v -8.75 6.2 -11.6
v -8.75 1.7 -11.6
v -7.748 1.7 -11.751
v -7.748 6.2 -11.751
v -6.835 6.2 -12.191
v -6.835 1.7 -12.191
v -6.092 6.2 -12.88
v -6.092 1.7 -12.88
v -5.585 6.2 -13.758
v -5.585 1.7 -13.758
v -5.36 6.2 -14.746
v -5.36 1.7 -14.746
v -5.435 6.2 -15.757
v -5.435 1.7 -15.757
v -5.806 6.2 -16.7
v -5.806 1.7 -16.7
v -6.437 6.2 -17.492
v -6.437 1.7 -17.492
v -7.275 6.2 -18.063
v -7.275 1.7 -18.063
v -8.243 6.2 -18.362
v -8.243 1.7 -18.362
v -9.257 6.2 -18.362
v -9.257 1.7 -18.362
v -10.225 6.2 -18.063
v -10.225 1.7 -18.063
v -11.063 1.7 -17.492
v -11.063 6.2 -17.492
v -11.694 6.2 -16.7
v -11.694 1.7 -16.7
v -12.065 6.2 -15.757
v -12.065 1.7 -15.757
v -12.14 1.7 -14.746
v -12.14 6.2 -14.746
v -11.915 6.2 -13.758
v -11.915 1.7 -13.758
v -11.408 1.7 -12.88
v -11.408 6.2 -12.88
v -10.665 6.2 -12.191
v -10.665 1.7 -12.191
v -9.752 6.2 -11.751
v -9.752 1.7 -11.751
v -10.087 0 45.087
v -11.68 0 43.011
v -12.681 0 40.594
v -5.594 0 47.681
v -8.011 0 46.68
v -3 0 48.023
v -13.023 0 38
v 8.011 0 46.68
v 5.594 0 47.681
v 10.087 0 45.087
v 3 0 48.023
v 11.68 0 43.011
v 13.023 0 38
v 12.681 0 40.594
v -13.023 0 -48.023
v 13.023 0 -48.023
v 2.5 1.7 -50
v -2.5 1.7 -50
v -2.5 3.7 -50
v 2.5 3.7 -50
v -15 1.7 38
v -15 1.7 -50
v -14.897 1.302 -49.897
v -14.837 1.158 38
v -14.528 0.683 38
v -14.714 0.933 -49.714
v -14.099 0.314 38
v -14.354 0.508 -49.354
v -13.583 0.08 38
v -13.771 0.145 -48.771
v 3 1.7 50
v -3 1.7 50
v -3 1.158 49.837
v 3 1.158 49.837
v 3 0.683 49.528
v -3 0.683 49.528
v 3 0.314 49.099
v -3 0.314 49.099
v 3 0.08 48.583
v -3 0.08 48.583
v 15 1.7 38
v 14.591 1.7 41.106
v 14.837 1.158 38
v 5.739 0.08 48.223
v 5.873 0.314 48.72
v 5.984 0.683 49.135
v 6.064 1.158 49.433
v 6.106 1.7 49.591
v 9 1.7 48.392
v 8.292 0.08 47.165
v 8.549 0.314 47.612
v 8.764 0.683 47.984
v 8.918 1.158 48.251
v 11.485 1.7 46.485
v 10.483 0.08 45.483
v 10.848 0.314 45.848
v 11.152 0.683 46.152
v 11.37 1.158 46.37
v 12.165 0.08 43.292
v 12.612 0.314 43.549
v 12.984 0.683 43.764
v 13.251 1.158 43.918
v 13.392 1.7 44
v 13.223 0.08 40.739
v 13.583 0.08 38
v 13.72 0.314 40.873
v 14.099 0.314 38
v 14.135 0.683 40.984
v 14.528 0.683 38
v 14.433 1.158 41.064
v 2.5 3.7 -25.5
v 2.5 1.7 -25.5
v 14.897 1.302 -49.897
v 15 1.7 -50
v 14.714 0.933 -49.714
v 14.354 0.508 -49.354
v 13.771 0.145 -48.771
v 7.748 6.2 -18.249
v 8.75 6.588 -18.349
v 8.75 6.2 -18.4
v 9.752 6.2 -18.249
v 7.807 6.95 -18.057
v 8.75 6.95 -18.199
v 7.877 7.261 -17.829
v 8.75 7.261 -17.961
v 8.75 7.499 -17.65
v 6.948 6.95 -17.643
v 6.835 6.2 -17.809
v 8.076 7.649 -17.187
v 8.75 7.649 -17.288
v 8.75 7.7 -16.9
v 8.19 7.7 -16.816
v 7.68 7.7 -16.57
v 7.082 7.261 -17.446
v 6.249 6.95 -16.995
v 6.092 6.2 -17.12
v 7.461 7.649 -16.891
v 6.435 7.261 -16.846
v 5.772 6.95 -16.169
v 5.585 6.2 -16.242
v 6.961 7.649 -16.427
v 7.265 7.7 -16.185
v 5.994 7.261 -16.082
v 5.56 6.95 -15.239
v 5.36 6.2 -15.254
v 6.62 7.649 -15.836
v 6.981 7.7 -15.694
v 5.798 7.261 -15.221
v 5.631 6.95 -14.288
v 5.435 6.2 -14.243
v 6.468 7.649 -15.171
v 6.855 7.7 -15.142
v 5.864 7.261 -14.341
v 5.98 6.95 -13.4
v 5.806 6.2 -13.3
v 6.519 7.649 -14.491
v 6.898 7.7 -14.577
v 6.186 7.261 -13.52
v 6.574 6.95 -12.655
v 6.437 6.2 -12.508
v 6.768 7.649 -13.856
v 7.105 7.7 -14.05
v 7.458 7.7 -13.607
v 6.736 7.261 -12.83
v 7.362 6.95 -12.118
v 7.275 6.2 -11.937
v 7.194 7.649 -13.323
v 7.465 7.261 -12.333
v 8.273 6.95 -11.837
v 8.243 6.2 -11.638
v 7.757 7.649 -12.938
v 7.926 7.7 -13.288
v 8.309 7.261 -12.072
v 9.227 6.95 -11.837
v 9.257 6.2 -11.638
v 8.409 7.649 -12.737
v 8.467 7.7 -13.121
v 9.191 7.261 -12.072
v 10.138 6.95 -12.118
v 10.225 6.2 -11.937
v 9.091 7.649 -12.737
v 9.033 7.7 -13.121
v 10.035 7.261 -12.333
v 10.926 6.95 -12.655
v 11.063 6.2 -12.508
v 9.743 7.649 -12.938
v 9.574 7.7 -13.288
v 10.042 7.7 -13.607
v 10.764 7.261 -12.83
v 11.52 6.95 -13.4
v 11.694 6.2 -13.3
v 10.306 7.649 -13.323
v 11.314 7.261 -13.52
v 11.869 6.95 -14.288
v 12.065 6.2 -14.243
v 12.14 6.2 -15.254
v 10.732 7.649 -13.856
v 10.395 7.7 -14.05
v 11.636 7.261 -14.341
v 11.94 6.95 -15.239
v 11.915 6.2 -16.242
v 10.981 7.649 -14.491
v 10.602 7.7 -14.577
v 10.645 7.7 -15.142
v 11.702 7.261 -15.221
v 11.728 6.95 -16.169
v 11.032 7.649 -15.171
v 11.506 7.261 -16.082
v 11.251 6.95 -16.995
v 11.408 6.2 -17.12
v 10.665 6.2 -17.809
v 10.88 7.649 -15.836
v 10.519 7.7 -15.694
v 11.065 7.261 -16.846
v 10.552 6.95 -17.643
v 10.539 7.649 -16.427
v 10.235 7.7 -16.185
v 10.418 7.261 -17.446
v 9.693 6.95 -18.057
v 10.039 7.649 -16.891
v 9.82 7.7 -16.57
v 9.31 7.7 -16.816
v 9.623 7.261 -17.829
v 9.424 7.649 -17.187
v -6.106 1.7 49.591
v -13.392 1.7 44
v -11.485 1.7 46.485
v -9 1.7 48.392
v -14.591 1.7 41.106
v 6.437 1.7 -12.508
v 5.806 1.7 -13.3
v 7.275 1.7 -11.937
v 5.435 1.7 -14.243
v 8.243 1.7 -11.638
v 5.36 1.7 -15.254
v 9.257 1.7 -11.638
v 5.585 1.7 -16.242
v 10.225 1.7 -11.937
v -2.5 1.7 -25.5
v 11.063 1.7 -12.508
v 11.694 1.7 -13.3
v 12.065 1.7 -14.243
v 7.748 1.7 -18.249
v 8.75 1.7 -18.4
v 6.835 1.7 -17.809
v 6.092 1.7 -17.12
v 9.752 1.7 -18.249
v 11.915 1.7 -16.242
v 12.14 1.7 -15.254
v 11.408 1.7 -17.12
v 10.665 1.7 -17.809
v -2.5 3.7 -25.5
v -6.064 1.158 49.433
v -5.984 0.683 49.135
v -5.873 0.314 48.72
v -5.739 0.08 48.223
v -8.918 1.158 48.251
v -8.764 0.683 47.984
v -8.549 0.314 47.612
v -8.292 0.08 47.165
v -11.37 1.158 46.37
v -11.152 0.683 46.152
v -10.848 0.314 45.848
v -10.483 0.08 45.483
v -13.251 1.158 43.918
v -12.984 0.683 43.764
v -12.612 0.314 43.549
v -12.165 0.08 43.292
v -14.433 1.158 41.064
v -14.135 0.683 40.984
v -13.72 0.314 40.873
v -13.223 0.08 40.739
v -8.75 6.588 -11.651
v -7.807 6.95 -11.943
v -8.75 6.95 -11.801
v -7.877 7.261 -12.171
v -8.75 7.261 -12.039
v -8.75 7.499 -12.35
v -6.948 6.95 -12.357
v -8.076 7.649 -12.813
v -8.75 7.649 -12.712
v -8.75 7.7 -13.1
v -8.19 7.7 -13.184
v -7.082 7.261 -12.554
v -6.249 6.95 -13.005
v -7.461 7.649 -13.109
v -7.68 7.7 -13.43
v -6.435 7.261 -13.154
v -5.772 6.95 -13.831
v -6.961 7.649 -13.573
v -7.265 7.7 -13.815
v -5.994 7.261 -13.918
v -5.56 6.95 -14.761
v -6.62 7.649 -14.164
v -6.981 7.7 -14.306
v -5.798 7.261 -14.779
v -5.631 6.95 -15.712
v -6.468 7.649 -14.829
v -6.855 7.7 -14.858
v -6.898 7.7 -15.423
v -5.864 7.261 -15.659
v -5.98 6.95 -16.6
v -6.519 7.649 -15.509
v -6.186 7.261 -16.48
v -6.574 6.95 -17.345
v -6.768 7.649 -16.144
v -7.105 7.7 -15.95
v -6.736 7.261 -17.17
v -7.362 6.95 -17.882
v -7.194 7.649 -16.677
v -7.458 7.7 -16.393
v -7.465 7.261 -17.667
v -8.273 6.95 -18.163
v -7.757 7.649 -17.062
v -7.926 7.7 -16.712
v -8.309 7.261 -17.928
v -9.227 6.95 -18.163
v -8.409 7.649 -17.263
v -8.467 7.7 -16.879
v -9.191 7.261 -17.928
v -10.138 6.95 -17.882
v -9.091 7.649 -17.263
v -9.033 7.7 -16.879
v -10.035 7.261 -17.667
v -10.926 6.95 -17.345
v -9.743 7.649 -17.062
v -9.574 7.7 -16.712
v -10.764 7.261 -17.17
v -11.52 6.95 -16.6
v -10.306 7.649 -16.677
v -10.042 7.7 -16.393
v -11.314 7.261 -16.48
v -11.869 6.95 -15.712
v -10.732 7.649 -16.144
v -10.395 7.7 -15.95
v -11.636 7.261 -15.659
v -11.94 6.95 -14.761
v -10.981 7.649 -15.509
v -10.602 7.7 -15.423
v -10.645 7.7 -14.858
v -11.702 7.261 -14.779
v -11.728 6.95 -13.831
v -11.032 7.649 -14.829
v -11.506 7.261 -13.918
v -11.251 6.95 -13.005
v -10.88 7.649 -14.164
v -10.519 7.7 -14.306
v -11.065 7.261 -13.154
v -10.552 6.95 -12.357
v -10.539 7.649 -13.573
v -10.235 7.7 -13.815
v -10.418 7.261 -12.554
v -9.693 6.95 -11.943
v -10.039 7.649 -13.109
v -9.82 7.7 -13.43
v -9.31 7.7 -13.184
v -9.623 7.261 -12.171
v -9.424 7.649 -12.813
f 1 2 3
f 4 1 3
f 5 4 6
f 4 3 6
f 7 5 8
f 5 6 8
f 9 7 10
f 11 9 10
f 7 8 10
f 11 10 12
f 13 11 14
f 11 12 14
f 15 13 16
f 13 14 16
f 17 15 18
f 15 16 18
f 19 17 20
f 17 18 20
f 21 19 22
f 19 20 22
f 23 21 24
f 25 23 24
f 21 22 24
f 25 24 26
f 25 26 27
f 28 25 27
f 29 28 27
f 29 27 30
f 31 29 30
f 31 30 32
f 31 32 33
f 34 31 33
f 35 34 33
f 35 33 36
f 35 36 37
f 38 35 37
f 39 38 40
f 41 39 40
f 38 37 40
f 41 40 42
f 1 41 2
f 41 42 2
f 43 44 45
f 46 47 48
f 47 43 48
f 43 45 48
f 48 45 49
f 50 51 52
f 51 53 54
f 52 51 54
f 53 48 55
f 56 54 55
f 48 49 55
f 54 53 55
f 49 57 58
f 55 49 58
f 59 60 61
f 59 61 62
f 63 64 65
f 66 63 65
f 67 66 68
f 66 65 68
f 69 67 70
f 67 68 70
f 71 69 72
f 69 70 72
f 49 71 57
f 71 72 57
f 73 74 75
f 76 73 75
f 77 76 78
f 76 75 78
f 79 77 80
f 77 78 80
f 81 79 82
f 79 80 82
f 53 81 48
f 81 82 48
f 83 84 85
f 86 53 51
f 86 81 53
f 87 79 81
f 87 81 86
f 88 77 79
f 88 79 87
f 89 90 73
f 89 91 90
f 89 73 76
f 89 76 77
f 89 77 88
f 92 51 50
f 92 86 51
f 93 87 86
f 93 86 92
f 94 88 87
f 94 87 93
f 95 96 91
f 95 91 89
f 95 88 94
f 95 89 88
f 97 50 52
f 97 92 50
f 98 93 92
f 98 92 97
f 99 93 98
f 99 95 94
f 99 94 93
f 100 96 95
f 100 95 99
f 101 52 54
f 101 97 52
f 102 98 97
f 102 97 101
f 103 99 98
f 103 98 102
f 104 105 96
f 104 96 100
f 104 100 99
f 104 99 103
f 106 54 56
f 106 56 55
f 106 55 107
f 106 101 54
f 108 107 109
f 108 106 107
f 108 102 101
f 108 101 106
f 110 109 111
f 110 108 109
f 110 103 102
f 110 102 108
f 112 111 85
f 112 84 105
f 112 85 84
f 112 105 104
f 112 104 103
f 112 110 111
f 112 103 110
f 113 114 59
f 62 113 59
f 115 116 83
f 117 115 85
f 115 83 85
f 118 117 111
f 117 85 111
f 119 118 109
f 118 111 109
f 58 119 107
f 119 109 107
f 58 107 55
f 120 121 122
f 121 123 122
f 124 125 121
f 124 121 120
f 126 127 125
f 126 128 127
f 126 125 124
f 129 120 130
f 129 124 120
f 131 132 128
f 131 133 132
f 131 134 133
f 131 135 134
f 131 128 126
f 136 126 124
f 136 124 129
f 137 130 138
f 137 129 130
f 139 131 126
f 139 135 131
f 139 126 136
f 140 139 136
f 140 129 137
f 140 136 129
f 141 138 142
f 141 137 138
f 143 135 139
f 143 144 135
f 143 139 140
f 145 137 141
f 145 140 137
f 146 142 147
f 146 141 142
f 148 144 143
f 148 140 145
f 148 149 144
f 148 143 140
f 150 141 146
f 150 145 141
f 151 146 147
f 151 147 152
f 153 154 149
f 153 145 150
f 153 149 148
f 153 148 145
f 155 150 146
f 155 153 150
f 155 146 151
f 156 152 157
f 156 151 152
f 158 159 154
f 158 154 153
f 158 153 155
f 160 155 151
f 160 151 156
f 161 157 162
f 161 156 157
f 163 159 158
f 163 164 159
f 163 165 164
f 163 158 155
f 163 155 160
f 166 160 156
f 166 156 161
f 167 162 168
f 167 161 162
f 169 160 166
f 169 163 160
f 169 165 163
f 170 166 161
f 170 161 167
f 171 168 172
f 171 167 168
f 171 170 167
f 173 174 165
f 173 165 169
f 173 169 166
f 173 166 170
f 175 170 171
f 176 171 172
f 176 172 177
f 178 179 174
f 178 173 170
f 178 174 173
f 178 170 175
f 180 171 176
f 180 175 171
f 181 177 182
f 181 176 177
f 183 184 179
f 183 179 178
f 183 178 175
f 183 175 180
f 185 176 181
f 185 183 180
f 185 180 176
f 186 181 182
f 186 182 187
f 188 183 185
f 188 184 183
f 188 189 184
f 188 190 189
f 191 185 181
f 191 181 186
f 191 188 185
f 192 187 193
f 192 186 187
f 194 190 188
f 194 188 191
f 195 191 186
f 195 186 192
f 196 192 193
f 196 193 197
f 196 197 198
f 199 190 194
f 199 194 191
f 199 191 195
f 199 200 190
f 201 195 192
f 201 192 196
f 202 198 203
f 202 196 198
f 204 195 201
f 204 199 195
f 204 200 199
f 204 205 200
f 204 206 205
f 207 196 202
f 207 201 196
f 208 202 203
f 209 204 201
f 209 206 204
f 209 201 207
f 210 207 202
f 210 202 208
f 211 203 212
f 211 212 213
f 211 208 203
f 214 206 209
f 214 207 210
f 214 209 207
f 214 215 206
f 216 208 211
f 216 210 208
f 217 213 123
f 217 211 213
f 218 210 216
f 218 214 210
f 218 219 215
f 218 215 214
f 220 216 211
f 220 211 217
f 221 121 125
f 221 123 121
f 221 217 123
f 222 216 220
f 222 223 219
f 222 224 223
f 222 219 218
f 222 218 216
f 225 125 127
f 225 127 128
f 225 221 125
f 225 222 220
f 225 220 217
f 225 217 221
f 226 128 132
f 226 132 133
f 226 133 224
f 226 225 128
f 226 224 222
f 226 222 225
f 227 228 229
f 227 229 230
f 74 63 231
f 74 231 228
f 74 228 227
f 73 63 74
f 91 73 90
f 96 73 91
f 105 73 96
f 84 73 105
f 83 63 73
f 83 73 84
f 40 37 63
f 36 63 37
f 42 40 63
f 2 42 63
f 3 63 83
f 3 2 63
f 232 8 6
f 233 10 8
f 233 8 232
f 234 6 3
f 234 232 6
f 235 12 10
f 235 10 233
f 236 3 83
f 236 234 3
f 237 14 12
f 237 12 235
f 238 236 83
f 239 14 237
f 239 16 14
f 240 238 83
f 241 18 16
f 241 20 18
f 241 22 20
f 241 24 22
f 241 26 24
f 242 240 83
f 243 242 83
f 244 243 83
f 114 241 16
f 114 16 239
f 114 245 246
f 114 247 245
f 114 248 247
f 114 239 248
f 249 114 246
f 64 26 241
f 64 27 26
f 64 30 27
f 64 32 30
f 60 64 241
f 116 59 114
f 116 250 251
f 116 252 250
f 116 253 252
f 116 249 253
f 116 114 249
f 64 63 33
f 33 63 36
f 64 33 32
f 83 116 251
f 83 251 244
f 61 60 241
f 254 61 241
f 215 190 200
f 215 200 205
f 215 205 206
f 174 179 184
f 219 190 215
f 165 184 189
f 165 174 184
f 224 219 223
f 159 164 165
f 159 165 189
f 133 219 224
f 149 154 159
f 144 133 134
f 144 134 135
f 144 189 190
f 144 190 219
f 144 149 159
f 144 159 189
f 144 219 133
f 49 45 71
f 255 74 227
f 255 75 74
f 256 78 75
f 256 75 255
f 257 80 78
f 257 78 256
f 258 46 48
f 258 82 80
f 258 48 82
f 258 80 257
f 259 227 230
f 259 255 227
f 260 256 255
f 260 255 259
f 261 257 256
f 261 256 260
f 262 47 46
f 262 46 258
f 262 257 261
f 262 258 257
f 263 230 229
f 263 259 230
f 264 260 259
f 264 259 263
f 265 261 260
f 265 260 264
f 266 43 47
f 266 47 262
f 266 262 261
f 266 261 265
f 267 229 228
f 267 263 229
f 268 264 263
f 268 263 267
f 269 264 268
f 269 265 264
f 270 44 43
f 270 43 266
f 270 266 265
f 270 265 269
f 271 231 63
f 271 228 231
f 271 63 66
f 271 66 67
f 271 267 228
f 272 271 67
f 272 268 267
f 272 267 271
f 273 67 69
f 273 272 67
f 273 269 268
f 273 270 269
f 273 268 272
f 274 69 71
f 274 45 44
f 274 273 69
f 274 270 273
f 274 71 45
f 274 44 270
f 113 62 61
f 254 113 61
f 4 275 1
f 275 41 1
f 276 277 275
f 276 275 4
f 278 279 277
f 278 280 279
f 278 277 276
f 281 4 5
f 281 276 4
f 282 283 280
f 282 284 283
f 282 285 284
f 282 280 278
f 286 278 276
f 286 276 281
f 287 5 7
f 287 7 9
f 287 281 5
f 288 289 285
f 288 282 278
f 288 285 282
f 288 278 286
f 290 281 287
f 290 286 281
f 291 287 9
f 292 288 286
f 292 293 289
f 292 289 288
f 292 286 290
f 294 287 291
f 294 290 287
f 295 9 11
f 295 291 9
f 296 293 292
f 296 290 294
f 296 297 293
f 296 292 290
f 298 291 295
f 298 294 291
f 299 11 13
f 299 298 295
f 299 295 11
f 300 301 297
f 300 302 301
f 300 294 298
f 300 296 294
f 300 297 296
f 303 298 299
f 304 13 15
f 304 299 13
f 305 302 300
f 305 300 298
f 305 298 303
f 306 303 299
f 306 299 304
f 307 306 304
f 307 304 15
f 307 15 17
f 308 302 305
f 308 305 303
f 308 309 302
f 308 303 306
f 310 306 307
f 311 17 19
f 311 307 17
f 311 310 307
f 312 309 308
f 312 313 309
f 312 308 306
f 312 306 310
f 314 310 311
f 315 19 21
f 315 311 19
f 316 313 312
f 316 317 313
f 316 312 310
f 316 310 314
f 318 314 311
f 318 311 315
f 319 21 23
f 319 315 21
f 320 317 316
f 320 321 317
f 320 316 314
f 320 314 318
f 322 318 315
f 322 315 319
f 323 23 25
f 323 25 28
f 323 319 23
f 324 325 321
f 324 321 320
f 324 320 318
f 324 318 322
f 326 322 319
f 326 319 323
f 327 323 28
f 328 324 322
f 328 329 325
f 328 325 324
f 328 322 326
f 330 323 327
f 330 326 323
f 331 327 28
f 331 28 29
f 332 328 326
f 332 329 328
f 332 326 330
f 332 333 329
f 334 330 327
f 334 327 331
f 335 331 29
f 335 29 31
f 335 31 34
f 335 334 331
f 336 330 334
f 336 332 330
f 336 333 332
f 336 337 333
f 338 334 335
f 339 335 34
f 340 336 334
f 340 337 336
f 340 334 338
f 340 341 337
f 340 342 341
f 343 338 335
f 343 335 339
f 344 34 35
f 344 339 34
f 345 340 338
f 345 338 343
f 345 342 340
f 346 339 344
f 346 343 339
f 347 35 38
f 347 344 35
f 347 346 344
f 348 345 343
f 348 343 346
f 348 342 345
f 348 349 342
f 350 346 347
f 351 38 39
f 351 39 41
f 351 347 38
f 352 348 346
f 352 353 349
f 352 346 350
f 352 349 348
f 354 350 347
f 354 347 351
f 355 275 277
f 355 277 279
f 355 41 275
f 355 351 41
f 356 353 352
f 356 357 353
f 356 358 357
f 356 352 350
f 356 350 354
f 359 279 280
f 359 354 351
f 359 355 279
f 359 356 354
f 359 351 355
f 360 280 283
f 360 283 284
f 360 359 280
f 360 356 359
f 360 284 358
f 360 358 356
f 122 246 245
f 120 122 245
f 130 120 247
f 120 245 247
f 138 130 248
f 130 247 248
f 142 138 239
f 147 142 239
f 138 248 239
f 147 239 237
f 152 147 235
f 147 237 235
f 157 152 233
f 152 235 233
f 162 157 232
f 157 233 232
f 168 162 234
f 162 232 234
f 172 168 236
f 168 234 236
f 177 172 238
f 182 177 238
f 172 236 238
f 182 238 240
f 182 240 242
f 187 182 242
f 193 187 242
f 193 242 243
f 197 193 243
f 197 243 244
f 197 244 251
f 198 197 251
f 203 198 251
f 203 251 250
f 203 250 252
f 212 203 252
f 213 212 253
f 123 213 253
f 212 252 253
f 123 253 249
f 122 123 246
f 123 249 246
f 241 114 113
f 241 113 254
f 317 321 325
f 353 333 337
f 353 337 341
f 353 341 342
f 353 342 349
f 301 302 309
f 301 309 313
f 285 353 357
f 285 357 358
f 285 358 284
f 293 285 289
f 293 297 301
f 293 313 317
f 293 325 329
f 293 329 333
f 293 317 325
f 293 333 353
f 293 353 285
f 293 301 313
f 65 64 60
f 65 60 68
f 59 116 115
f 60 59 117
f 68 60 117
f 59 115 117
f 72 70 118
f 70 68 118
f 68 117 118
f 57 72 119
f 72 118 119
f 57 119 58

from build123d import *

# Parameters (mm, degrees)
SKETCH1_W           = 30
SKETCH1_H           = 100
BOSS_EXTRUDE1_DEPTH = 1.7
FILLET2_R           = 12
FILLET3_R           = 2
BOSS_EXTRUDE2_DEPTH = 2
SKETCH4_R           = 3.4
BOSS_EXTRUDE3_DEPTH = 6
FILLET4_R           = 1.5


with BuildPart() as part:
    # Sketch1 → Boss-Extrude1 (new body)
    with BuildSketch(Plane(origin=(0, 0, 0), x_dir=(1, 0, 0), z_dir=(0, 1, 0))):
        Rectangle(SKETCH1_W, SKETCH1_H)
    extrude(amount=BOSS_EXTRUDE1_DEPTH)

    # Fillet2
    fillet2_edges = [part.edges().sort_by_distance(p)[0] for p in [
        (-15, 0.85, 50),
        (15, 0.85, 50),
    ]]
    fillet(fillet2_edges, radius=FILLET2_R)

    # Fillet3
    # the kernel refuses this fillet: 2 mm, written as the material it takes off along each edge
    with BuildSketch(Plane(origin=(19.943429983, 0, -50), x_dir=(0, 0, 1), z_dir=(-1, 0, 0))) as fillet3_piece_1:
        with BuildLine():
            CenterArc((1.977371993, 2), FILLET3_R, 188.626926559, 81.373073441)
            Line((0, 1.7), (-0.03954744, 1.694))
            ThreePointArc((-0.03954744, 1.694), (-0.04, 0.85), (-0.04, 0))
            Line((-0.04, 0), (0, -0.04))
            Line((0, -0.04), (1.977371993, -0.04))
            Line((1.977371993, -0.04), (1.977371993, 0))
        make_face()
    extrude(amount=39.886859967, mode=Mode.SUBTRACT)
    with BuildSketch(Plane(origin=(-15, 0, -54.943429983), x_dir=(1, 0, 0), z_dir=(0, 0, 1)), Plane(origin=(15, 0, 38), x_dir=(-1, 0, 0), z_dir=(0, 0, -1))) as fillet3_piece_2:
        with BuildLine():
            CenterArc((1.977371993, 2), FILLET3_R, 188.626926559, 81.373073441)
            Line((0, 1.7), (-0.03954744, 1.694))
            ThreePointArc((-0.03954744, 1.694), (-0.04, 0.85), (-0.04, 0))
            Line((-0.04, 0), (0, -0.04))
            Line((0, -0.04), (1.977371993, -0.04))
            Line((1.977371993, -0.04), (1.977371993, 0))
        make_face()
    extrude(amount=92.943429983, mode=Mode.SUBTRACT)
    with BuildSketch(Plane(origin=(-3, 0, 38), x_dir=(0, 0, 1), z_dir=(1, 0, 0))) as fillet3_piece_3:
        with BuildLine():
            CenterArc((10.022628007, -2), FILLET3_R, 8.626926559, 81.373073441)
            Line((12, -1.7), (12.03954744, -1.694))
            ThreePointArc((12.03954744, -1.694), (12.04, -0.85), (12.04, 0))
            Line((12.04, 0), (12, 0.04))
            Line((12, 0.04), (10.022628007, 0.04))
            Line((10.022628007, 0.04), (10.022628007, 0))
        make_face()
    revolve(axis=Axis((-3, 0, 38), (0, -1, 0)), revolution_arc=90, mode=Mode.SUBTRACT)
    with BuildSketch(Plane(origin=(-3, 0, 50), x_dir=(0, 1, 0), z_dir=(1, 0, 0))) as fillet3_piece_4:
        with BuildLine():
            CenterArc((2, -1.977371993), FILLET3_R, 98.626926559, 81.373073441)
            Line((0, -1.977371993), (-0.04, -1.977371993))
            Line((-0.04, -1.977371993), (-0.04, 0))
            Line((-0.04, 0), (0, 0.04))
            ThreePointArc((0, 0.04), (0.85, 0.04), (1.694, 0.03954744))
            Line((1.694, 0.03954744), (1.7, 0))
        make_face()
    extrude(amount=6, mode=Mode.SUBTRACT)
    with BuildSketch(Plane(origin=(3, 0, 38), x_dir=(0, 0, 1), z_dir=(-1, 0, 0))) as fillet3_piece_5:
        with BuildLine():
            CenterArc((10.022628007, 2), FILLET3_R, 270, 81.373073441)
            Line((12, 1.7), (12.03954744, 1.694))
            ThreePointArc((12.03954744, 1.694), (12.04, 0.85), (12.04, 0))
            Line((12.04, 0), (12, -0.04))
            Line((12, -0.04), (10.022628007, -0.04))
            Line((10.022628007, -0.04), (10.022628007, 0))
        make_face()
    revolve(axis=Axis((3, 0, 38), (0, 1, 0)), revolution_arc=90, mode=Mode.SUBTRACT)

    # Sketch3 → Boss-Extrude2 (add)
    with BuildSketch(Plane(origin=(0, 1.7, 0), x_dir=(1, 0, 0), z_dir=(0, 1, 0))):
        Polygon((-2.5, 50), (2.5, 50), (2.5, 49.5), (2.5, 25.5), (-2.5, 25.5), (-2.5, 49.5), align=None)
    extrude(amount=BOSS_EXTRUDE2_DEPTH)

    # Sketch4 → Boss-Extrude3 (add)
    with BuildSketch(Plane(origin=(0, 1.7, 0), x_dir=(1, 0, 0), z_dir=(0, 1, 0))):
        with Locations(Location((-8.75, 15, 0), (0, 0, 270))):
            Circle(SKETCH4_R)
        with Locations(Location((8.75, 15, 0), (0, 0, 90))):
            Circle(SKETCH4_R)
    extrude(amount=BOSS_EXTRUDE3_DEPTH)

    # Fillet4
    fillet4_edges = [part.edges().sort_by_distance(p)[0] for p in [
        (-8.75, 7.7, -18.4),
        (8.75, 7.7, -11.6),
    ]]
    fillet(fillet4_edges, radius=FILLET4_R)


solid = part.part
